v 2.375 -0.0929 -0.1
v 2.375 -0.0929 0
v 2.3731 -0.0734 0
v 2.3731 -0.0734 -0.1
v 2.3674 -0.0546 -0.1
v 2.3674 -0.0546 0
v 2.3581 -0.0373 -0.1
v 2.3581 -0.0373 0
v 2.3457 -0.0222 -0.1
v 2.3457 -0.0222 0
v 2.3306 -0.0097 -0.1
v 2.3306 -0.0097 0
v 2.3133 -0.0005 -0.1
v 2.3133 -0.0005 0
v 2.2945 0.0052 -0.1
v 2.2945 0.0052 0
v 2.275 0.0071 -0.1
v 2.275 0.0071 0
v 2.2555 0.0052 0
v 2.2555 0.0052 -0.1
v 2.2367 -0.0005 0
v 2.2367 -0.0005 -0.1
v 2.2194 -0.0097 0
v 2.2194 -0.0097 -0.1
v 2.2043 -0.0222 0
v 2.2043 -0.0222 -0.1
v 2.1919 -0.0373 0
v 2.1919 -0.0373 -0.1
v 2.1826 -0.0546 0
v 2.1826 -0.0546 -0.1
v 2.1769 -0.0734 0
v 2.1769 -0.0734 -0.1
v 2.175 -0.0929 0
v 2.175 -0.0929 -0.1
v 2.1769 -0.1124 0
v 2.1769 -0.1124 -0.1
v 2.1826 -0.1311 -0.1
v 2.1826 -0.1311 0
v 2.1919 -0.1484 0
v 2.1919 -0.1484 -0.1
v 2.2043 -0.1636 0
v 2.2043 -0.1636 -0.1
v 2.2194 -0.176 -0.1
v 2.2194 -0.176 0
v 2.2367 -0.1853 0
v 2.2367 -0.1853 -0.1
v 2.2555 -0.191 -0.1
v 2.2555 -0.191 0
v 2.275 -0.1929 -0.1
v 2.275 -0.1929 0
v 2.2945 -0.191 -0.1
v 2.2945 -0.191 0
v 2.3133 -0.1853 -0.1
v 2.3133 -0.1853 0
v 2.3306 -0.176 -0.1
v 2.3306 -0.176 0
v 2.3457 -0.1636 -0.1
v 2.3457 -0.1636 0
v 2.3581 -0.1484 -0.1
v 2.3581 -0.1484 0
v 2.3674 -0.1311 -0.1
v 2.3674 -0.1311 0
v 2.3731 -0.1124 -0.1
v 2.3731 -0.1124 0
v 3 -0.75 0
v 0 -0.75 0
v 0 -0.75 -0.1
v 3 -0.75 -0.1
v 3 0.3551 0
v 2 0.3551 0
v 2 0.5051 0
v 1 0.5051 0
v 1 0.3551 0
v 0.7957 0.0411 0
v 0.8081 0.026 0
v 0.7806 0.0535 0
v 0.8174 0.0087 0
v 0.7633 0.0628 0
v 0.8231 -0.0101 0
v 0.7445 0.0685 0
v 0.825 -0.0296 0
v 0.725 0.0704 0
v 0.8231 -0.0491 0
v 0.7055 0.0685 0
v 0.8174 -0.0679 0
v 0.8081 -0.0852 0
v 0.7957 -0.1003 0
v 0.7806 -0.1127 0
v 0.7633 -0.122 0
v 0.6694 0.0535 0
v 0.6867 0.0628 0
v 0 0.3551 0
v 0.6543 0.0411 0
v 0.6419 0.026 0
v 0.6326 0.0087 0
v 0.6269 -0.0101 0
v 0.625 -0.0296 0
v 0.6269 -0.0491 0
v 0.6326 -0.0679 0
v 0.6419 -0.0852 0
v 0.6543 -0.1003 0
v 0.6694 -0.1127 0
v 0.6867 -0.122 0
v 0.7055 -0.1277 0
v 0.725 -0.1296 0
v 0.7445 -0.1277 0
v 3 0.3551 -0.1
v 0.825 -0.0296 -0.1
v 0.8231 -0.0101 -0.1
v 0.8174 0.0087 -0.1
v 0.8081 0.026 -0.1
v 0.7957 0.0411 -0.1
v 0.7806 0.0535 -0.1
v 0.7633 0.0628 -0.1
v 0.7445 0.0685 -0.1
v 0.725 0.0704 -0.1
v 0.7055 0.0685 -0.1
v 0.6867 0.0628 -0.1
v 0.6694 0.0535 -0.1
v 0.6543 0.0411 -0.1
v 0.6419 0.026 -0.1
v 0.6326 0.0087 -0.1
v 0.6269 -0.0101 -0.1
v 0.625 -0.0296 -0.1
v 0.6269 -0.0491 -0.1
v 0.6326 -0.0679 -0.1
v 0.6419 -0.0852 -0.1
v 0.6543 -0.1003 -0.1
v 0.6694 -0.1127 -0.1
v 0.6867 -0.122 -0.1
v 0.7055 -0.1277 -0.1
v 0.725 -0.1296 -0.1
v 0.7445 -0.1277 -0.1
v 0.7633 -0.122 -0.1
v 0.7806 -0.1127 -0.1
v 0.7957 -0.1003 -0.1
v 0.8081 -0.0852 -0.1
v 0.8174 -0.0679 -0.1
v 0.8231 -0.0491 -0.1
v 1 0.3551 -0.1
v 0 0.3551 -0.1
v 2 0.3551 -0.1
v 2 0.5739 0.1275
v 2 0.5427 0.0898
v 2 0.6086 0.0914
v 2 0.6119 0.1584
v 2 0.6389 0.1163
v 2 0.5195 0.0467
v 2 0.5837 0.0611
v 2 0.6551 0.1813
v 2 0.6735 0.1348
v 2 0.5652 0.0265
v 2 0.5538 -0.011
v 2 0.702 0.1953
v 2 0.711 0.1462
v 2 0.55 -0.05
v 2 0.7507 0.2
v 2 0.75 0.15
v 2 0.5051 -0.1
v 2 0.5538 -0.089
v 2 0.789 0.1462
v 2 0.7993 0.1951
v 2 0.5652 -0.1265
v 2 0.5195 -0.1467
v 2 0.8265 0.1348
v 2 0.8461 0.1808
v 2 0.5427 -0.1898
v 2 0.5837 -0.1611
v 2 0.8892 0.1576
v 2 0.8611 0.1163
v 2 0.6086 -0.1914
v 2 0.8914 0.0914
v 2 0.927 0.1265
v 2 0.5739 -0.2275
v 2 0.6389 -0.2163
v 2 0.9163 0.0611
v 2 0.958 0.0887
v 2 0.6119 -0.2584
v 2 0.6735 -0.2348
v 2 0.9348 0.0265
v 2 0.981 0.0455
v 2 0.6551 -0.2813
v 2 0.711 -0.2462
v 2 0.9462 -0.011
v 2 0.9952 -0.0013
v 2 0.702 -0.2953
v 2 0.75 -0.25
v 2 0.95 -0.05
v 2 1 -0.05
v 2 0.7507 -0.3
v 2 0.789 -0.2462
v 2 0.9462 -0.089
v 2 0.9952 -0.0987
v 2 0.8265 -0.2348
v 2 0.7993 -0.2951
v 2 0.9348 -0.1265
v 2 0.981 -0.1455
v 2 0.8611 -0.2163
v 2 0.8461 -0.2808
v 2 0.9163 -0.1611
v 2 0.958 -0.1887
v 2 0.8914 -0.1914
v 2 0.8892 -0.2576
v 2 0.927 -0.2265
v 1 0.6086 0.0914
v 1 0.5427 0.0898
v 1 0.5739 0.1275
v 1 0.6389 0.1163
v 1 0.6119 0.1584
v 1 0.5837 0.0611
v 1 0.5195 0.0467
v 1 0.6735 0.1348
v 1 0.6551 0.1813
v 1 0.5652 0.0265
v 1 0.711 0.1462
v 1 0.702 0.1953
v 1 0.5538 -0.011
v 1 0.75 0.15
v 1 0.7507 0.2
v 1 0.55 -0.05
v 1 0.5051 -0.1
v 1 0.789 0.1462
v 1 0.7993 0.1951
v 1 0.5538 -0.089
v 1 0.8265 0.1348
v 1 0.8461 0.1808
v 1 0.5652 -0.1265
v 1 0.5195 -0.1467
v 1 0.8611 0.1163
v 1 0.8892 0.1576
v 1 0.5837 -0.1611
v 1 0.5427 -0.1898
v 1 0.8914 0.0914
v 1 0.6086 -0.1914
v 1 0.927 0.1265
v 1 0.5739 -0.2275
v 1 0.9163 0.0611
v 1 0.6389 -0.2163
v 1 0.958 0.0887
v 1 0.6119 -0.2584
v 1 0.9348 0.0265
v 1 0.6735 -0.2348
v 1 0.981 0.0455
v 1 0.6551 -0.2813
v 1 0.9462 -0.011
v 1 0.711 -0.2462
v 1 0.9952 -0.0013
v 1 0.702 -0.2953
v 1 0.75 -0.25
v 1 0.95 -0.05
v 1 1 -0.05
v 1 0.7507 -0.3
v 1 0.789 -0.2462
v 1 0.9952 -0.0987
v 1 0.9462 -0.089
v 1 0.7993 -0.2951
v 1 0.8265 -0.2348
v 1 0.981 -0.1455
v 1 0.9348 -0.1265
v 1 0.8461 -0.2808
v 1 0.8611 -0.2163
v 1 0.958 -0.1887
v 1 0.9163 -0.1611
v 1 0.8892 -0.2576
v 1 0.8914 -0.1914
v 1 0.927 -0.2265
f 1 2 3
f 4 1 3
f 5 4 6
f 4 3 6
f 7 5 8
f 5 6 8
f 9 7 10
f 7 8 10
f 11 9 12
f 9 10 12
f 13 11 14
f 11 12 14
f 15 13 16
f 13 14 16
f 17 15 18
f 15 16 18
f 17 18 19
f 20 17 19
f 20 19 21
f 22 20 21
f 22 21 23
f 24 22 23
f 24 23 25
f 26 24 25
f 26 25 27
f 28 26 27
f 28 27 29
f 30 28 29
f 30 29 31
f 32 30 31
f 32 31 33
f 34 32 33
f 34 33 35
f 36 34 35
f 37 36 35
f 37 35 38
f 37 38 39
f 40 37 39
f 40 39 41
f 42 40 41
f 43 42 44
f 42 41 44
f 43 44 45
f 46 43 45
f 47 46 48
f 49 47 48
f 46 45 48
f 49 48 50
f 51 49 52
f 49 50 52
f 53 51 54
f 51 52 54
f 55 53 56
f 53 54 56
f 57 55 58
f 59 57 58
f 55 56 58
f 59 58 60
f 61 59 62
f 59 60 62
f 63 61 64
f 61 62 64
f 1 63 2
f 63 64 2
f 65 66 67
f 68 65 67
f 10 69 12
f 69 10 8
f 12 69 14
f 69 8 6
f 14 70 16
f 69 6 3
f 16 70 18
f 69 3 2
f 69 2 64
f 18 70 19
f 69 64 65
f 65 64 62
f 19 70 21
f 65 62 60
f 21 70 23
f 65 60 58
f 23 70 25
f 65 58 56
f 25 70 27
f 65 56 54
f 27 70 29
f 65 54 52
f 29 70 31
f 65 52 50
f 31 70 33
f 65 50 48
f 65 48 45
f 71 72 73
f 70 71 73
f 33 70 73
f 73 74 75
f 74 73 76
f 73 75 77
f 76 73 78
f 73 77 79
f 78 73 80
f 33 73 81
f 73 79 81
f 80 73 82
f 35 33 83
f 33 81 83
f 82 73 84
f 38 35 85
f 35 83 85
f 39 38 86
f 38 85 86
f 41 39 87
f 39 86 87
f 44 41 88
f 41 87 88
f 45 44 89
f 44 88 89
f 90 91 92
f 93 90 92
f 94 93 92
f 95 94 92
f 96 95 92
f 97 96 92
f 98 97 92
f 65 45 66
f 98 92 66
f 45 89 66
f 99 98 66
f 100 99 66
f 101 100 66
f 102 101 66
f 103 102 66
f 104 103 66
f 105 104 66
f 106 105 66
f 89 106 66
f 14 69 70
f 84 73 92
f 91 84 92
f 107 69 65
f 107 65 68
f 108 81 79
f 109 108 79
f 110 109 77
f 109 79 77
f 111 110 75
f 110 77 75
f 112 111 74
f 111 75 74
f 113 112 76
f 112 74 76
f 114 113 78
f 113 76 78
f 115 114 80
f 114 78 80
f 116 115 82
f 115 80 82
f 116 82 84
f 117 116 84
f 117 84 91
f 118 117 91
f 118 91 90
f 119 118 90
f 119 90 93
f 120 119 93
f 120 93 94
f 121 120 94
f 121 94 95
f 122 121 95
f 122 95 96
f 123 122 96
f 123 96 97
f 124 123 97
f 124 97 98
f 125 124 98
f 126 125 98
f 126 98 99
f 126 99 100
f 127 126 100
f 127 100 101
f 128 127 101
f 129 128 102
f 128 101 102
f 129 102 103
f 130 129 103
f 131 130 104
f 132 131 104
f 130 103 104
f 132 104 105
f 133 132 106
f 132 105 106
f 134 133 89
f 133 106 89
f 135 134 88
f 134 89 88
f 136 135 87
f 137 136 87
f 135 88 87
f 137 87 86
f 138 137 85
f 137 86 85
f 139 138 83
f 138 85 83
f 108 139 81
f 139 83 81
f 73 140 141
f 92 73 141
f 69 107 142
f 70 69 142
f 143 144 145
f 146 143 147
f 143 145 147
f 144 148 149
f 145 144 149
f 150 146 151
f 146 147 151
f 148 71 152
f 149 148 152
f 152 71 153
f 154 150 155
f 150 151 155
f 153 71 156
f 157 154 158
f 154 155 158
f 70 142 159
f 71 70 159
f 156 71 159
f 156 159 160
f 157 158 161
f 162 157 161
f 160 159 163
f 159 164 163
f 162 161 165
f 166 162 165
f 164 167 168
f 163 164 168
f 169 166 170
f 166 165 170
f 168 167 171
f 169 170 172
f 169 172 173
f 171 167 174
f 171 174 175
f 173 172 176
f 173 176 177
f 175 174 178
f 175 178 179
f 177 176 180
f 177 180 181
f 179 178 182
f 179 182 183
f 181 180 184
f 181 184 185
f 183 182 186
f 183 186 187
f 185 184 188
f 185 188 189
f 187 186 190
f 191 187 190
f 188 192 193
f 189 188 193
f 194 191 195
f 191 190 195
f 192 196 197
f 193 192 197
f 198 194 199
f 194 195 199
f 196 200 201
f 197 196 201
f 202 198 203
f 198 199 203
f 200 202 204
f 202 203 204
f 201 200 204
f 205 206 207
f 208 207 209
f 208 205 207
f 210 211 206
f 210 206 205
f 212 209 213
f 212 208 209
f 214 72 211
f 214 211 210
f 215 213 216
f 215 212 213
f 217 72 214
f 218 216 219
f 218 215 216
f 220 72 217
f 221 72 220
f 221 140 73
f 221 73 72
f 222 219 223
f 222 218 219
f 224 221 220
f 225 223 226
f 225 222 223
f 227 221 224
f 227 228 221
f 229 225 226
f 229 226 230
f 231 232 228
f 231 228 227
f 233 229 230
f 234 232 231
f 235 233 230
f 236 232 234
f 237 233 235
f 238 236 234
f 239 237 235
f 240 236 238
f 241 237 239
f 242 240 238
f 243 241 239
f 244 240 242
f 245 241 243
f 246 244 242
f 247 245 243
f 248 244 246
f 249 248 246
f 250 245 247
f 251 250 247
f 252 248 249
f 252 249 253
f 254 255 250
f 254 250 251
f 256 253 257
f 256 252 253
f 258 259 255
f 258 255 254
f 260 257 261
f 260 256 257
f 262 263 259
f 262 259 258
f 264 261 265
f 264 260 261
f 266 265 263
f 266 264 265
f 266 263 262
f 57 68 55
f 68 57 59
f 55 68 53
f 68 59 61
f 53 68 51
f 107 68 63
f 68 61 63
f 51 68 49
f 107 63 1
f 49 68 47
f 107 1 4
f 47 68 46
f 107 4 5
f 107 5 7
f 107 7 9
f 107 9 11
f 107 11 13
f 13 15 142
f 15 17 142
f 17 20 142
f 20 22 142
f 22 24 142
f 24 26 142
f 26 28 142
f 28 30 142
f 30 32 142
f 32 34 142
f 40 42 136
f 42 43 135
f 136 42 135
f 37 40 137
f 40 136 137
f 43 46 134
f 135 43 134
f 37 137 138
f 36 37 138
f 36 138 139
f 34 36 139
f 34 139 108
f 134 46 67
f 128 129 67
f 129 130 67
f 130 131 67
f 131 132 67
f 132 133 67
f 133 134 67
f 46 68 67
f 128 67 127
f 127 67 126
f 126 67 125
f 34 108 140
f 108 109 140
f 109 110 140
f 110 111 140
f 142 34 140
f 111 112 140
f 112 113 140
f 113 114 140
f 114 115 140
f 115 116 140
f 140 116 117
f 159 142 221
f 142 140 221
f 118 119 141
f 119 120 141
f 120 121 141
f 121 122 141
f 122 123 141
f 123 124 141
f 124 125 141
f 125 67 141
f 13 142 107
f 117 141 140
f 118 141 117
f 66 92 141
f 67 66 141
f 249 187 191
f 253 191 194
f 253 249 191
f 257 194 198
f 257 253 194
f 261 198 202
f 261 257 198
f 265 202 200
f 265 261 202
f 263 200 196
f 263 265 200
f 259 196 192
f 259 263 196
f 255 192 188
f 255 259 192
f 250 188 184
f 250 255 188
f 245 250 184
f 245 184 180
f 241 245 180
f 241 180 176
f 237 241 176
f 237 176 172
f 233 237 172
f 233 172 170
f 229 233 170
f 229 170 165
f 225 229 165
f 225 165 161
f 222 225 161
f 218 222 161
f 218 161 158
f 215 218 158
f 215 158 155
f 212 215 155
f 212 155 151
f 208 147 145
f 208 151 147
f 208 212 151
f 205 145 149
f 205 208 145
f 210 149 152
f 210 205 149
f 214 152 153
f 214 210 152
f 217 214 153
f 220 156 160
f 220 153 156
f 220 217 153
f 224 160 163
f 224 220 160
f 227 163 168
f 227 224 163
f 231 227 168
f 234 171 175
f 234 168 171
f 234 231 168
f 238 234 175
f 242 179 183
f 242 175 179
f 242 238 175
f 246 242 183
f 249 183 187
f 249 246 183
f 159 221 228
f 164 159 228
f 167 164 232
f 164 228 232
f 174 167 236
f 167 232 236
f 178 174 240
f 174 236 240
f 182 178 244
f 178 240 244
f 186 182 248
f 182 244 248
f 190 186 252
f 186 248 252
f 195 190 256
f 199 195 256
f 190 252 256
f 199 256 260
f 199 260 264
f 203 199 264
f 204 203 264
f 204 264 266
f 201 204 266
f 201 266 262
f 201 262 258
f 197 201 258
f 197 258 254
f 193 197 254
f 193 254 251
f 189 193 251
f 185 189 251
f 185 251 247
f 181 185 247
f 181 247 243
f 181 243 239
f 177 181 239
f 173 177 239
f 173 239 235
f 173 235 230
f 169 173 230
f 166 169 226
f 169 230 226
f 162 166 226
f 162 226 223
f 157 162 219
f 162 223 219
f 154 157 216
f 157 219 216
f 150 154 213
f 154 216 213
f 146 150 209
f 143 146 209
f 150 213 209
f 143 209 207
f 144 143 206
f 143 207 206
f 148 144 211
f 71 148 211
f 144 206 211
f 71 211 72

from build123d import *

# Parameters (mm, degrees)
SKETCH_2_R               = 0.2
EXTRUDE_1_DEPTH          = 3
CUT_EXTRUDE_1_DEPTH      = 3
CUT_EXTRUDE_1_DEPTH_BACK = 3
SKETCH_3_W               = 1
SKETCH_3_H               = 1.471690569
SKETCH_4_R               = 0.1
CUT_EXTRUDE_2_DEPTH      = 3


with BuildPart() as part:
    # 草图2 → 凸台-拉伸1 (new body)
    with BuildSketch(Plane(origin=(0, 0, 0), x_dir=(0, 0, -1), z_dir=(1, 0, 0))):
        with BuildLine():
            Line((0, -0.75), (0.1, -0.75))
            Line((0.1, -0.75), (0.1, 0.505051026))
            ThreePointArc((0.1, 0.505051026), (0.05, 1), (0, 0.505051026))
            Line((0, 0.505051026), (0, -0.75))
        make_face()
        with Locations((0.05, 0.75)):
            Circle(SKETCH_2_R, mode=Mode.SUBTRACT)
    extrude(amount=EXTRUDE_1_DEPTH)

    # 草图3 → 切除-拉伸1 (cut, two sides: drawn at the far end of the back side and taken through both)
    with BuildSketch(Plane(origin=(0, 0, -0.1), x_dir=(-1, 0, 0), z_dir=(0, 0, -1)).offset(-CUT_EXTRUDE_1_DEPTH_BACK)):
        with Locations((-2.5, 1.090896311)):
            Rectangle(SKETCH_3_W, SKETCH_3_H)
        with Locations((-0.5, 1.090896311)):
            Rectangle(SKETCH_3_W, SKETCH_3_H)
    extrude(amount=CUT_EXTRUDE_1_DEPTH + CUT_EXTRUDE_1_DEPTH_BACK, mode=Mode.SUBTRACT)

    # 草图4 → 切除-拉伸2 (cut)
    with BuildSketch(Plane.XY):
        with Locations((0.725, -0.029598001)):
            Circle(SKETCH_4_R)
        with Locations((2.275, -0.092876486)):
            Circle(SKETCH_4_R)
    extrude(amount=-CUT_EXTRUDE_2_DEPTH, mode=Mode.SUBTRACT)


solid = part.part
